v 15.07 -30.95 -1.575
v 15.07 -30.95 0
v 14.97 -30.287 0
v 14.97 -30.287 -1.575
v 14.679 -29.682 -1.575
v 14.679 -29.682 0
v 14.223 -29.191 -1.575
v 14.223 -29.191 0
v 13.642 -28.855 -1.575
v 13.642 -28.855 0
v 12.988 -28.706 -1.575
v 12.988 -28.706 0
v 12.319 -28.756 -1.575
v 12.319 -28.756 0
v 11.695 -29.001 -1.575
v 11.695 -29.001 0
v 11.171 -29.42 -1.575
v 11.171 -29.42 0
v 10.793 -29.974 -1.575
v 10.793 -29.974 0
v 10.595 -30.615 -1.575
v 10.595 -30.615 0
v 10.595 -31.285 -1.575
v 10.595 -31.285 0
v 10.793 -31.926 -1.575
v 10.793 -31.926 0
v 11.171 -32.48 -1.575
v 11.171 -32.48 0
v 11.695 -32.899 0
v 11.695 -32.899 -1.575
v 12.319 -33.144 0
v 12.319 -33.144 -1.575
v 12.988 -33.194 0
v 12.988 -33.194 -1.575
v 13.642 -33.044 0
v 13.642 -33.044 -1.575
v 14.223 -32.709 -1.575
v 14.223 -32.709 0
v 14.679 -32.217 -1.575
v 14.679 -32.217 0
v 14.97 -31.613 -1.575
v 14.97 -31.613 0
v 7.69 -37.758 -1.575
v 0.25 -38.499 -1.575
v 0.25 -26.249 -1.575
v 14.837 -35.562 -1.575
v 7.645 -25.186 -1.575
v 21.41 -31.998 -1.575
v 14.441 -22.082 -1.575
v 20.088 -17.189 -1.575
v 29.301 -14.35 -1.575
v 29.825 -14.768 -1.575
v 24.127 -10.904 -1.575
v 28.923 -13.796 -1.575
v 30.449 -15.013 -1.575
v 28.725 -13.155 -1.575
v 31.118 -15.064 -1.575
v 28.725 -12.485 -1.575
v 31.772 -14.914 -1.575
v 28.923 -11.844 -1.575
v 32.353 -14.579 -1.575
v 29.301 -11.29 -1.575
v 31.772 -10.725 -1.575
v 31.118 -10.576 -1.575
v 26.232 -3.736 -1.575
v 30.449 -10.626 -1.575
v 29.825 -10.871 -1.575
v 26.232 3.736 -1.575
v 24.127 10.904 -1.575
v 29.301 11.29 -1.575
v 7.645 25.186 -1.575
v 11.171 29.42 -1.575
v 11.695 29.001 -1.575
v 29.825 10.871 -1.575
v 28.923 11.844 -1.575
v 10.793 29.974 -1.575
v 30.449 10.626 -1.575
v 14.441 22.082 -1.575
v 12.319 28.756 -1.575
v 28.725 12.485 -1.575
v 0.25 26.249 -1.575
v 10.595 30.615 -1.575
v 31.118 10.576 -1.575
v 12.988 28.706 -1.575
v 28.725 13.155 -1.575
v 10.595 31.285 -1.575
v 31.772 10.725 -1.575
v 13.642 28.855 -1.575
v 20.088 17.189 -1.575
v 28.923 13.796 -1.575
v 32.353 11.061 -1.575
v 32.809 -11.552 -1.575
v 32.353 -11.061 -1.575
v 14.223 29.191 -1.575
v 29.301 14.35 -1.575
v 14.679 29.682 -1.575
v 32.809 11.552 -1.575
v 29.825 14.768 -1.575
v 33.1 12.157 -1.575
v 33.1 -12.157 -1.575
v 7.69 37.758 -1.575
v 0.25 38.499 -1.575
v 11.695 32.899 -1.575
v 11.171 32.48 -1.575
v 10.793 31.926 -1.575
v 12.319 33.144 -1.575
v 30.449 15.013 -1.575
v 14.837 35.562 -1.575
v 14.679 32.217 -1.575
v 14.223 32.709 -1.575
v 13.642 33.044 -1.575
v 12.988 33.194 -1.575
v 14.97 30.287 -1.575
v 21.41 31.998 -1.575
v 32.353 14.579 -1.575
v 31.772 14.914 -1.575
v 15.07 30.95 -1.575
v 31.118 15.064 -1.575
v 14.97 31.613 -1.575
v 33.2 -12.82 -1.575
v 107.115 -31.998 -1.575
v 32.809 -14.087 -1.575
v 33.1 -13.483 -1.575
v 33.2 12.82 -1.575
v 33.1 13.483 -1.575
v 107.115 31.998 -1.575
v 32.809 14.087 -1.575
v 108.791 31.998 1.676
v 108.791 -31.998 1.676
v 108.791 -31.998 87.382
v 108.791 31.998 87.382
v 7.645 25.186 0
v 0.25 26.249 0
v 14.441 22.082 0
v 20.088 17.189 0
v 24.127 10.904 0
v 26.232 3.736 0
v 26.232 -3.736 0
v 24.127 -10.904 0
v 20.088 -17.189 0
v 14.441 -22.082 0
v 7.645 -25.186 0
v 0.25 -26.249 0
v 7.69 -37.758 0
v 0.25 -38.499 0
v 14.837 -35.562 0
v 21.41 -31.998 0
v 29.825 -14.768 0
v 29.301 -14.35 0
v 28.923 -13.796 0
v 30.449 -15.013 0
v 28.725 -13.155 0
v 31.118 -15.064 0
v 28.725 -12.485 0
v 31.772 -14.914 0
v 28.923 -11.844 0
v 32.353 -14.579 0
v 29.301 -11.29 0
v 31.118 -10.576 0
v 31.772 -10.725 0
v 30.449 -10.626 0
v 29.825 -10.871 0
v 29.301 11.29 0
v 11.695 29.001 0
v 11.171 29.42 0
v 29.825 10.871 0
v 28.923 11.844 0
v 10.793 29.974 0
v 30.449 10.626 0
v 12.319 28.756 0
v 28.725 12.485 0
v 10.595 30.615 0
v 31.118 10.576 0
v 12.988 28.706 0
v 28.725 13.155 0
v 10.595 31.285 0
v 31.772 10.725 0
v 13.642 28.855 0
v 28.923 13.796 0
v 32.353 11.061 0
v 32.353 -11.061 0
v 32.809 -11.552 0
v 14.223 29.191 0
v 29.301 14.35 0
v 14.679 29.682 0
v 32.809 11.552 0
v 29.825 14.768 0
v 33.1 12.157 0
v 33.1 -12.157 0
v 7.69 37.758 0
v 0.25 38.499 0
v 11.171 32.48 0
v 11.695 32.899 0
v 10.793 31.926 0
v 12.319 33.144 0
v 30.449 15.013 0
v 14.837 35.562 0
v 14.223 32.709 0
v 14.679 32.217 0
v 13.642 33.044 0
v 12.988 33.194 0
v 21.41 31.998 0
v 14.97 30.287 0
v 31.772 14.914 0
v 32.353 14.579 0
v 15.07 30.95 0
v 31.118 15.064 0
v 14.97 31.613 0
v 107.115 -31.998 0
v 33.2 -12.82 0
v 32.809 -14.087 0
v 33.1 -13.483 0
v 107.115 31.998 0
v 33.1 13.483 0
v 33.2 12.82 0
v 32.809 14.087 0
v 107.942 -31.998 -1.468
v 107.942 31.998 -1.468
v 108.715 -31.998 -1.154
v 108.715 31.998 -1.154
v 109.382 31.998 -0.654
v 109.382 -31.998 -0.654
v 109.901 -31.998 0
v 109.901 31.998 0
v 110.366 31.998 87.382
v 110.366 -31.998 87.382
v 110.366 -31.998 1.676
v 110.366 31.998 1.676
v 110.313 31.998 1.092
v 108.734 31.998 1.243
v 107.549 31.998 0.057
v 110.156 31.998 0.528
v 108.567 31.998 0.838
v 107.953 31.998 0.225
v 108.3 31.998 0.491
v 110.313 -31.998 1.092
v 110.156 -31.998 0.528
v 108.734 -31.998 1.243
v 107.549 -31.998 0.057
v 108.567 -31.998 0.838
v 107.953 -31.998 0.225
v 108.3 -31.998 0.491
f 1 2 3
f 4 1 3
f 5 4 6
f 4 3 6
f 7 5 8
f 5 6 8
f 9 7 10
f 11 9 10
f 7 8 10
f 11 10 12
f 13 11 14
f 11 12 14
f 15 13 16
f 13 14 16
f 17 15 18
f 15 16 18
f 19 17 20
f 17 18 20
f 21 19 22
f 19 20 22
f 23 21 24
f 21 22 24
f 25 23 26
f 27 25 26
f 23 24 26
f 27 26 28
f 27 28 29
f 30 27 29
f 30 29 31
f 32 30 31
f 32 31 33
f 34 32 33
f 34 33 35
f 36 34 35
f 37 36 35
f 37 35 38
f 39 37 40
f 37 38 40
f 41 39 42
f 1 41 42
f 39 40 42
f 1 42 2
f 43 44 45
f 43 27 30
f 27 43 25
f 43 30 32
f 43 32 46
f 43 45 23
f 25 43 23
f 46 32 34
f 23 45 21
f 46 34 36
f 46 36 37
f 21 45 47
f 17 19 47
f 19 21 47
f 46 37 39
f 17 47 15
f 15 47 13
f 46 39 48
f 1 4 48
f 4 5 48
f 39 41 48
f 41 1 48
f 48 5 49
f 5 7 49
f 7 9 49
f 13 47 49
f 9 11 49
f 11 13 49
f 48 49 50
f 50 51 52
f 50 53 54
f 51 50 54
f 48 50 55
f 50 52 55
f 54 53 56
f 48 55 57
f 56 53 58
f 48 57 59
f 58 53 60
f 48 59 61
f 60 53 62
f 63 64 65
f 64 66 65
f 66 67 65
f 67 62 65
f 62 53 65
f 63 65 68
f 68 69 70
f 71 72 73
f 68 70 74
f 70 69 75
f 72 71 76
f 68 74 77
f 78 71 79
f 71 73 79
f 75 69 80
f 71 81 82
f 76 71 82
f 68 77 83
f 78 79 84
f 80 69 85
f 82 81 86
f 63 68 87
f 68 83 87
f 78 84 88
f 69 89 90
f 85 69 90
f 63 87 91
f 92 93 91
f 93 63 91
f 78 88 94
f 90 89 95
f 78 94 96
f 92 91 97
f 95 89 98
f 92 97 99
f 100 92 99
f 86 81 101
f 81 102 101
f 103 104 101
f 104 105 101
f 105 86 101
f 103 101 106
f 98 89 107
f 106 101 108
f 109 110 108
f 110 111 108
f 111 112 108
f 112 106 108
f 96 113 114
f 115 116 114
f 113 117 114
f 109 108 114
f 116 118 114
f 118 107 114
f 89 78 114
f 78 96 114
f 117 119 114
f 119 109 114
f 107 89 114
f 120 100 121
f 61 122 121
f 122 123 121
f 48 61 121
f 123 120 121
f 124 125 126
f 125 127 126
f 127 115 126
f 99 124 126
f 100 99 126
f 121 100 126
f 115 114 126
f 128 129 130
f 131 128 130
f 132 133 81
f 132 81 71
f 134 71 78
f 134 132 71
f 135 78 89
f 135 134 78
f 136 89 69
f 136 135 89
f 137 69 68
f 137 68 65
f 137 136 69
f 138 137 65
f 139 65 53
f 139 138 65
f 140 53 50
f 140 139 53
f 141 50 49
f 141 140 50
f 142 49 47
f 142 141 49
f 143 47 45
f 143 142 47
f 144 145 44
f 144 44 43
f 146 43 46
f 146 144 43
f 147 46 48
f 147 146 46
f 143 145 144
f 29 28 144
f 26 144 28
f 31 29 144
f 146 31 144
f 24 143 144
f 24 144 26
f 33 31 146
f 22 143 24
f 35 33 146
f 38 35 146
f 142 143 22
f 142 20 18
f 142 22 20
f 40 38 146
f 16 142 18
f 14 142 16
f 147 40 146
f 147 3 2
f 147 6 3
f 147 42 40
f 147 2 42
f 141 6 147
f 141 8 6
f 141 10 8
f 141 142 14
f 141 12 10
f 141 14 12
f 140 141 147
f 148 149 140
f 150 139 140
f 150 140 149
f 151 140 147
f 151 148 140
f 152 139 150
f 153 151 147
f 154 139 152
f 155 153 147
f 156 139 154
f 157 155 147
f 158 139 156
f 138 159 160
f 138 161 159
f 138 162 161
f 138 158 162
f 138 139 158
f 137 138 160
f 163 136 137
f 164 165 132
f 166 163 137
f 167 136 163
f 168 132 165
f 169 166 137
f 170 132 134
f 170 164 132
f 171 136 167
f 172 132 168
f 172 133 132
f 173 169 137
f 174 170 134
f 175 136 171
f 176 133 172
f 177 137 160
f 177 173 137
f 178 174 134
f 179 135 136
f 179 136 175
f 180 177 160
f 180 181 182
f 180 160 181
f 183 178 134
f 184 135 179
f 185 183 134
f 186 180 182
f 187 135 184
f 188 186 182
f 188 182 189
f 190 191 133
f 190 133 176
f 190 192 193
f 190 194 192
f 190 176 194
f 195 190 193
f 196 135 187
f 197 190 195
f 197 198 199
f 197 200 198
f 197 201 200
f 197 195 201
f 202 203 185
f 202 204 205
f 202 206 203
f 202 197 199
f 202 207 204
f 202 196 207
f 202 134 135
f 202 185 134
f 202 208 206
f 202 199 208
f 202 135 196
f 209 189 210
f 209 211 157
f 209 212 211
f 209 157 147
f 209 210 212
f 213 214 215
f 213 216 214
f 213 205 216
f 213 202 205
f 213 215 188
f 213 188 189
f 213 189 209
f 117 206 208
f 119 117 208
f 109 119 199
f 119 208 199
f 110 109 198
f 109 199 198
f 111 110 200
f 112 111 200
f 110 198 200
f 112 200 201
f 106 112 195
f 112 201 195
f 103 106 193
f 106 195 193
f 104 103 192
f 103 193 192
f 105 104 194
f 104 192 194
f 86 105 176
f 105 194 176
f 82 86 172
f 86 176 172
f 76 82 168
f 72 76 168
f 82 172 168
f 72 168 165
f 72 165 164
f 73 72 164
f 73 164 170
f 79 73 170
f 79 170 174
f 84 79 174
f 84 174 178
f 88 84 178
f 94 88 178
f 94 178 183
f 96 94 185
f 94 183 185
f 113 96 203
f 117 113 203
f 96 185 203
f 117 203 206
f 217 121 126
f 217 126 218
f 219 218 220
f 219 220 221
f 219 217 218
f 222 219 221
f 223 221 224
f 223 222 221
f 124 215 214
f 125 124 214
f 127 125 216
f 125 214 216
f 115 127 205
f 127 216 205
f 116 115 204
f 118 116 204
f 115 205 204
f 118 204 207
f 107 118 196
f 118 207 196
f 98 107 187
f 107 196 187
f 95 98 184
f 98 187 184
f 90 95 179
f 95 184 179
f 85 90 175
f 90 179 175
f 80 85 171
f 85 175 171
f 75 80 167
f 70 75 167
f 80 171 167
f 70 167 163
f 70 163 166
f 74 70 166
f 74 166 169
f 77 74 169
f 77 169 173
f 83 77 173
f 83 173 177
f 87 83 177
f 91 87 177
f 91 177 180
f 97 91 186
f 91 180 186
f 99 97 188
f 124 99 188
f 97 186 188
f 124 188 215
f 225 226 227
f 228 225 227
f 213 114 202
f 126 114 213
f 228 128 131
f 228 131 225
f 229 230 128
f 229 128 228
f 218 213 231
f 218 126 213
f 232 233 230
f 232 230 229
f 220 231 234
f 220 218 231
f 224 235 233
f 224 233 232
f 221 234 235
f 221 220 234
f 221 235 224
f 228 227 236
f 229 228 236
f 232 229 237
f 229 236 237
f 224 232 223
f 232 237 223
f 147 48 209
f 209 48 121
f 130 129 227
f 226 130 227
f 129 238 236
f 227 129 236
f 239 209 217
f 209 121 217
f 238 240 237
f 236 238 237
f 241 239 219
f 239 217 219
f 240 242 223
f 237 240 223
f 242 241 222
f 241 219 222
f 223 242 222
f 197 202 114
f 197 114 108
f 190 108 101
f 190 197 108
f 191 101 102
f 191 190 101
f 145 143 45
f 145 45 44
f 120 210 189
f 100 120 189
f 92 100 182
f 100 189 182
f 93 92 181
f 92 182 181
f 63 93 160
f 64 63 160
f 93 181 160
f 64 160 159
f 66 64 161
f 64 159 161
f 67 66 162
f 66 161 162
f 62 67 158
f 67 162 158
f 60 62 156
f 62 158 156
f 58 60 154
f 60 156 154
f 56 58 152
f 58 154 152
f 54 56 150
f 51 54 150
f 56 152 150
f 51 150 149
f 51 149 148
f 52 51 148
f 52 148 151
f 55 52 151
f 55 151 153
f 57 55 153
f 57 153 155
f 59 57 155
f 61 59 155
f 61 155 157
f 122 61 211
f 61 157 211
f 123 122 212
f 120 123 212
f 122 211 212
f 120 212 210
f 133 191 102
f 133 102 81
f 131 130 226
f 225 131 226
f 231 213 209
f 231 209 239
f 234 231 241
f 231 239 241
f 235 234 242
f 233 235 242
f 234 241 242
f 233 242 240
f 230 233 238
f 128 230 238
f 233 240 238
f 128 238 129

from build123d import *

# Parameters (mm, degrees)
SKETCH1_R              = 2.25
BASE_FLANGE1_DEPTH     = 1.5748
SKETCHED_START         = -31.998080115
SKETCHED_BEND1_DEPTH   = 63.99616023
SKETCHED_BEND1_2_DEPTH = 63.99616023


# Read off the part's stored shape, not the designer's step: Sketched Bend1
# Sheet-metal steps are written as plain solids
with BuildPart() as part:
    # Sketch1 → Base-Flange1 (new body)
    with BuildSketch(Plane.XY):
        with BuildLine():
            Line((0.25, 38.499188303), (0.25, 26.248809497))
            ThreePointArc((0.25, 26.248809497), (26.498809497, 0), (0.25, -26.248809497))
            Line((0.25, -26.248809497), (0.25, -38.499188303))
            ThreePointArc((0.25, -38.499188303), (11.317914827, -36.837266048), (21.409644298, -31.998080115))
            Line((21.409644298, -31.998080115), (102.929679939, -31.998080115))
            Line((102.929679939, -31.998080115), (196.443018387, -31.998080115))
            Line((196.443018387, -31.998080115), (196.443018387, 31.998080115))
            Line((196.443018387, 31.998080115), (102.929679939, 31.998080115))
            Line((102.929679939, 31.998080115), (21.409644298, 31.998080115))
            ThreePointArc((21.409644298, 31.998080115), (11.317914827, 36.837266048), (0.25, 38.499188303))
        make_face()
        with Locations((12.819894984, 30.949964339)):
            Circle(SKETCH1_R, mode=Mode.SUBTRACT)
        with Locations((30.949964339, 12.819894984)):
            Circle(SKETCH1_R, mode=Mode.SUBTRACT)
        with Locations((30.949964339, -12.819894984)):
            Circle(SKETCH1_R, mode=Mode.SUBTRACT)
        with Locations((12.819894984, -30.949964339)):
            Circle(SKETCH1_R, mode=Mode.SUBTRACT)
    extrude(amount=-BASE_FLANGE1_DEPTH)

    # Sketched Bend1 outline → Sketched Bend1 (cut)
    with BuildSketch(Plane(origin=(0, 0, 0), x_dir=(1, 0, 0), z_dir=(0, 1, 0)).offset(SKETCHED_START)):
        with BuildLine():
            ThreePointArc((107.11495185, 1.5748), (108.71495025, 1.153848498), (109.90062672, 0))
            Line((109.90062672, 0), (196.443018387, 0))
            Line((196.443018387, 0), (196.443018387, 1.5748))
            Line((196.443018387, 1.5748), (107.11495185, 1.5748))
        make_face()
    extrude(amount=SKETCHED_BEND1_DEPTH, mode=Mode.SUBTRACT)

    # Sketched Bend1 2 outline → Sketched Bend1 2 (add)
    with BuildSketch(Plane(origin=(0, 0, 0), x_dir=(1, 0, 0), z_dir=(0, 1, 0)).offset(SKETCHED_START)):
        with BuildLine():
            Line((108.79135185, -1.6764), (108.79135185, -87.381707553))
            Line((108.79135185, -87.381707553), (110.36615185, -87.381707553))
            Line((110.36615185, -87.381707553), (110.36615185, -1.6764))
            ThreePointArc((110.36615185, -1.6764), (110.247609474, -0.806481813), (109.90062672, 0))
            Line((109.90062672, 0), (107.11495185, 0))
            ThreePointArc((107.11495185, 0), (108.300345658, -0.491006192), (108.79135185, -1.6764))
        make_face()
    extrude(amount=SKETCHED_BEND1_2_DEPTH)


solid = part.part
